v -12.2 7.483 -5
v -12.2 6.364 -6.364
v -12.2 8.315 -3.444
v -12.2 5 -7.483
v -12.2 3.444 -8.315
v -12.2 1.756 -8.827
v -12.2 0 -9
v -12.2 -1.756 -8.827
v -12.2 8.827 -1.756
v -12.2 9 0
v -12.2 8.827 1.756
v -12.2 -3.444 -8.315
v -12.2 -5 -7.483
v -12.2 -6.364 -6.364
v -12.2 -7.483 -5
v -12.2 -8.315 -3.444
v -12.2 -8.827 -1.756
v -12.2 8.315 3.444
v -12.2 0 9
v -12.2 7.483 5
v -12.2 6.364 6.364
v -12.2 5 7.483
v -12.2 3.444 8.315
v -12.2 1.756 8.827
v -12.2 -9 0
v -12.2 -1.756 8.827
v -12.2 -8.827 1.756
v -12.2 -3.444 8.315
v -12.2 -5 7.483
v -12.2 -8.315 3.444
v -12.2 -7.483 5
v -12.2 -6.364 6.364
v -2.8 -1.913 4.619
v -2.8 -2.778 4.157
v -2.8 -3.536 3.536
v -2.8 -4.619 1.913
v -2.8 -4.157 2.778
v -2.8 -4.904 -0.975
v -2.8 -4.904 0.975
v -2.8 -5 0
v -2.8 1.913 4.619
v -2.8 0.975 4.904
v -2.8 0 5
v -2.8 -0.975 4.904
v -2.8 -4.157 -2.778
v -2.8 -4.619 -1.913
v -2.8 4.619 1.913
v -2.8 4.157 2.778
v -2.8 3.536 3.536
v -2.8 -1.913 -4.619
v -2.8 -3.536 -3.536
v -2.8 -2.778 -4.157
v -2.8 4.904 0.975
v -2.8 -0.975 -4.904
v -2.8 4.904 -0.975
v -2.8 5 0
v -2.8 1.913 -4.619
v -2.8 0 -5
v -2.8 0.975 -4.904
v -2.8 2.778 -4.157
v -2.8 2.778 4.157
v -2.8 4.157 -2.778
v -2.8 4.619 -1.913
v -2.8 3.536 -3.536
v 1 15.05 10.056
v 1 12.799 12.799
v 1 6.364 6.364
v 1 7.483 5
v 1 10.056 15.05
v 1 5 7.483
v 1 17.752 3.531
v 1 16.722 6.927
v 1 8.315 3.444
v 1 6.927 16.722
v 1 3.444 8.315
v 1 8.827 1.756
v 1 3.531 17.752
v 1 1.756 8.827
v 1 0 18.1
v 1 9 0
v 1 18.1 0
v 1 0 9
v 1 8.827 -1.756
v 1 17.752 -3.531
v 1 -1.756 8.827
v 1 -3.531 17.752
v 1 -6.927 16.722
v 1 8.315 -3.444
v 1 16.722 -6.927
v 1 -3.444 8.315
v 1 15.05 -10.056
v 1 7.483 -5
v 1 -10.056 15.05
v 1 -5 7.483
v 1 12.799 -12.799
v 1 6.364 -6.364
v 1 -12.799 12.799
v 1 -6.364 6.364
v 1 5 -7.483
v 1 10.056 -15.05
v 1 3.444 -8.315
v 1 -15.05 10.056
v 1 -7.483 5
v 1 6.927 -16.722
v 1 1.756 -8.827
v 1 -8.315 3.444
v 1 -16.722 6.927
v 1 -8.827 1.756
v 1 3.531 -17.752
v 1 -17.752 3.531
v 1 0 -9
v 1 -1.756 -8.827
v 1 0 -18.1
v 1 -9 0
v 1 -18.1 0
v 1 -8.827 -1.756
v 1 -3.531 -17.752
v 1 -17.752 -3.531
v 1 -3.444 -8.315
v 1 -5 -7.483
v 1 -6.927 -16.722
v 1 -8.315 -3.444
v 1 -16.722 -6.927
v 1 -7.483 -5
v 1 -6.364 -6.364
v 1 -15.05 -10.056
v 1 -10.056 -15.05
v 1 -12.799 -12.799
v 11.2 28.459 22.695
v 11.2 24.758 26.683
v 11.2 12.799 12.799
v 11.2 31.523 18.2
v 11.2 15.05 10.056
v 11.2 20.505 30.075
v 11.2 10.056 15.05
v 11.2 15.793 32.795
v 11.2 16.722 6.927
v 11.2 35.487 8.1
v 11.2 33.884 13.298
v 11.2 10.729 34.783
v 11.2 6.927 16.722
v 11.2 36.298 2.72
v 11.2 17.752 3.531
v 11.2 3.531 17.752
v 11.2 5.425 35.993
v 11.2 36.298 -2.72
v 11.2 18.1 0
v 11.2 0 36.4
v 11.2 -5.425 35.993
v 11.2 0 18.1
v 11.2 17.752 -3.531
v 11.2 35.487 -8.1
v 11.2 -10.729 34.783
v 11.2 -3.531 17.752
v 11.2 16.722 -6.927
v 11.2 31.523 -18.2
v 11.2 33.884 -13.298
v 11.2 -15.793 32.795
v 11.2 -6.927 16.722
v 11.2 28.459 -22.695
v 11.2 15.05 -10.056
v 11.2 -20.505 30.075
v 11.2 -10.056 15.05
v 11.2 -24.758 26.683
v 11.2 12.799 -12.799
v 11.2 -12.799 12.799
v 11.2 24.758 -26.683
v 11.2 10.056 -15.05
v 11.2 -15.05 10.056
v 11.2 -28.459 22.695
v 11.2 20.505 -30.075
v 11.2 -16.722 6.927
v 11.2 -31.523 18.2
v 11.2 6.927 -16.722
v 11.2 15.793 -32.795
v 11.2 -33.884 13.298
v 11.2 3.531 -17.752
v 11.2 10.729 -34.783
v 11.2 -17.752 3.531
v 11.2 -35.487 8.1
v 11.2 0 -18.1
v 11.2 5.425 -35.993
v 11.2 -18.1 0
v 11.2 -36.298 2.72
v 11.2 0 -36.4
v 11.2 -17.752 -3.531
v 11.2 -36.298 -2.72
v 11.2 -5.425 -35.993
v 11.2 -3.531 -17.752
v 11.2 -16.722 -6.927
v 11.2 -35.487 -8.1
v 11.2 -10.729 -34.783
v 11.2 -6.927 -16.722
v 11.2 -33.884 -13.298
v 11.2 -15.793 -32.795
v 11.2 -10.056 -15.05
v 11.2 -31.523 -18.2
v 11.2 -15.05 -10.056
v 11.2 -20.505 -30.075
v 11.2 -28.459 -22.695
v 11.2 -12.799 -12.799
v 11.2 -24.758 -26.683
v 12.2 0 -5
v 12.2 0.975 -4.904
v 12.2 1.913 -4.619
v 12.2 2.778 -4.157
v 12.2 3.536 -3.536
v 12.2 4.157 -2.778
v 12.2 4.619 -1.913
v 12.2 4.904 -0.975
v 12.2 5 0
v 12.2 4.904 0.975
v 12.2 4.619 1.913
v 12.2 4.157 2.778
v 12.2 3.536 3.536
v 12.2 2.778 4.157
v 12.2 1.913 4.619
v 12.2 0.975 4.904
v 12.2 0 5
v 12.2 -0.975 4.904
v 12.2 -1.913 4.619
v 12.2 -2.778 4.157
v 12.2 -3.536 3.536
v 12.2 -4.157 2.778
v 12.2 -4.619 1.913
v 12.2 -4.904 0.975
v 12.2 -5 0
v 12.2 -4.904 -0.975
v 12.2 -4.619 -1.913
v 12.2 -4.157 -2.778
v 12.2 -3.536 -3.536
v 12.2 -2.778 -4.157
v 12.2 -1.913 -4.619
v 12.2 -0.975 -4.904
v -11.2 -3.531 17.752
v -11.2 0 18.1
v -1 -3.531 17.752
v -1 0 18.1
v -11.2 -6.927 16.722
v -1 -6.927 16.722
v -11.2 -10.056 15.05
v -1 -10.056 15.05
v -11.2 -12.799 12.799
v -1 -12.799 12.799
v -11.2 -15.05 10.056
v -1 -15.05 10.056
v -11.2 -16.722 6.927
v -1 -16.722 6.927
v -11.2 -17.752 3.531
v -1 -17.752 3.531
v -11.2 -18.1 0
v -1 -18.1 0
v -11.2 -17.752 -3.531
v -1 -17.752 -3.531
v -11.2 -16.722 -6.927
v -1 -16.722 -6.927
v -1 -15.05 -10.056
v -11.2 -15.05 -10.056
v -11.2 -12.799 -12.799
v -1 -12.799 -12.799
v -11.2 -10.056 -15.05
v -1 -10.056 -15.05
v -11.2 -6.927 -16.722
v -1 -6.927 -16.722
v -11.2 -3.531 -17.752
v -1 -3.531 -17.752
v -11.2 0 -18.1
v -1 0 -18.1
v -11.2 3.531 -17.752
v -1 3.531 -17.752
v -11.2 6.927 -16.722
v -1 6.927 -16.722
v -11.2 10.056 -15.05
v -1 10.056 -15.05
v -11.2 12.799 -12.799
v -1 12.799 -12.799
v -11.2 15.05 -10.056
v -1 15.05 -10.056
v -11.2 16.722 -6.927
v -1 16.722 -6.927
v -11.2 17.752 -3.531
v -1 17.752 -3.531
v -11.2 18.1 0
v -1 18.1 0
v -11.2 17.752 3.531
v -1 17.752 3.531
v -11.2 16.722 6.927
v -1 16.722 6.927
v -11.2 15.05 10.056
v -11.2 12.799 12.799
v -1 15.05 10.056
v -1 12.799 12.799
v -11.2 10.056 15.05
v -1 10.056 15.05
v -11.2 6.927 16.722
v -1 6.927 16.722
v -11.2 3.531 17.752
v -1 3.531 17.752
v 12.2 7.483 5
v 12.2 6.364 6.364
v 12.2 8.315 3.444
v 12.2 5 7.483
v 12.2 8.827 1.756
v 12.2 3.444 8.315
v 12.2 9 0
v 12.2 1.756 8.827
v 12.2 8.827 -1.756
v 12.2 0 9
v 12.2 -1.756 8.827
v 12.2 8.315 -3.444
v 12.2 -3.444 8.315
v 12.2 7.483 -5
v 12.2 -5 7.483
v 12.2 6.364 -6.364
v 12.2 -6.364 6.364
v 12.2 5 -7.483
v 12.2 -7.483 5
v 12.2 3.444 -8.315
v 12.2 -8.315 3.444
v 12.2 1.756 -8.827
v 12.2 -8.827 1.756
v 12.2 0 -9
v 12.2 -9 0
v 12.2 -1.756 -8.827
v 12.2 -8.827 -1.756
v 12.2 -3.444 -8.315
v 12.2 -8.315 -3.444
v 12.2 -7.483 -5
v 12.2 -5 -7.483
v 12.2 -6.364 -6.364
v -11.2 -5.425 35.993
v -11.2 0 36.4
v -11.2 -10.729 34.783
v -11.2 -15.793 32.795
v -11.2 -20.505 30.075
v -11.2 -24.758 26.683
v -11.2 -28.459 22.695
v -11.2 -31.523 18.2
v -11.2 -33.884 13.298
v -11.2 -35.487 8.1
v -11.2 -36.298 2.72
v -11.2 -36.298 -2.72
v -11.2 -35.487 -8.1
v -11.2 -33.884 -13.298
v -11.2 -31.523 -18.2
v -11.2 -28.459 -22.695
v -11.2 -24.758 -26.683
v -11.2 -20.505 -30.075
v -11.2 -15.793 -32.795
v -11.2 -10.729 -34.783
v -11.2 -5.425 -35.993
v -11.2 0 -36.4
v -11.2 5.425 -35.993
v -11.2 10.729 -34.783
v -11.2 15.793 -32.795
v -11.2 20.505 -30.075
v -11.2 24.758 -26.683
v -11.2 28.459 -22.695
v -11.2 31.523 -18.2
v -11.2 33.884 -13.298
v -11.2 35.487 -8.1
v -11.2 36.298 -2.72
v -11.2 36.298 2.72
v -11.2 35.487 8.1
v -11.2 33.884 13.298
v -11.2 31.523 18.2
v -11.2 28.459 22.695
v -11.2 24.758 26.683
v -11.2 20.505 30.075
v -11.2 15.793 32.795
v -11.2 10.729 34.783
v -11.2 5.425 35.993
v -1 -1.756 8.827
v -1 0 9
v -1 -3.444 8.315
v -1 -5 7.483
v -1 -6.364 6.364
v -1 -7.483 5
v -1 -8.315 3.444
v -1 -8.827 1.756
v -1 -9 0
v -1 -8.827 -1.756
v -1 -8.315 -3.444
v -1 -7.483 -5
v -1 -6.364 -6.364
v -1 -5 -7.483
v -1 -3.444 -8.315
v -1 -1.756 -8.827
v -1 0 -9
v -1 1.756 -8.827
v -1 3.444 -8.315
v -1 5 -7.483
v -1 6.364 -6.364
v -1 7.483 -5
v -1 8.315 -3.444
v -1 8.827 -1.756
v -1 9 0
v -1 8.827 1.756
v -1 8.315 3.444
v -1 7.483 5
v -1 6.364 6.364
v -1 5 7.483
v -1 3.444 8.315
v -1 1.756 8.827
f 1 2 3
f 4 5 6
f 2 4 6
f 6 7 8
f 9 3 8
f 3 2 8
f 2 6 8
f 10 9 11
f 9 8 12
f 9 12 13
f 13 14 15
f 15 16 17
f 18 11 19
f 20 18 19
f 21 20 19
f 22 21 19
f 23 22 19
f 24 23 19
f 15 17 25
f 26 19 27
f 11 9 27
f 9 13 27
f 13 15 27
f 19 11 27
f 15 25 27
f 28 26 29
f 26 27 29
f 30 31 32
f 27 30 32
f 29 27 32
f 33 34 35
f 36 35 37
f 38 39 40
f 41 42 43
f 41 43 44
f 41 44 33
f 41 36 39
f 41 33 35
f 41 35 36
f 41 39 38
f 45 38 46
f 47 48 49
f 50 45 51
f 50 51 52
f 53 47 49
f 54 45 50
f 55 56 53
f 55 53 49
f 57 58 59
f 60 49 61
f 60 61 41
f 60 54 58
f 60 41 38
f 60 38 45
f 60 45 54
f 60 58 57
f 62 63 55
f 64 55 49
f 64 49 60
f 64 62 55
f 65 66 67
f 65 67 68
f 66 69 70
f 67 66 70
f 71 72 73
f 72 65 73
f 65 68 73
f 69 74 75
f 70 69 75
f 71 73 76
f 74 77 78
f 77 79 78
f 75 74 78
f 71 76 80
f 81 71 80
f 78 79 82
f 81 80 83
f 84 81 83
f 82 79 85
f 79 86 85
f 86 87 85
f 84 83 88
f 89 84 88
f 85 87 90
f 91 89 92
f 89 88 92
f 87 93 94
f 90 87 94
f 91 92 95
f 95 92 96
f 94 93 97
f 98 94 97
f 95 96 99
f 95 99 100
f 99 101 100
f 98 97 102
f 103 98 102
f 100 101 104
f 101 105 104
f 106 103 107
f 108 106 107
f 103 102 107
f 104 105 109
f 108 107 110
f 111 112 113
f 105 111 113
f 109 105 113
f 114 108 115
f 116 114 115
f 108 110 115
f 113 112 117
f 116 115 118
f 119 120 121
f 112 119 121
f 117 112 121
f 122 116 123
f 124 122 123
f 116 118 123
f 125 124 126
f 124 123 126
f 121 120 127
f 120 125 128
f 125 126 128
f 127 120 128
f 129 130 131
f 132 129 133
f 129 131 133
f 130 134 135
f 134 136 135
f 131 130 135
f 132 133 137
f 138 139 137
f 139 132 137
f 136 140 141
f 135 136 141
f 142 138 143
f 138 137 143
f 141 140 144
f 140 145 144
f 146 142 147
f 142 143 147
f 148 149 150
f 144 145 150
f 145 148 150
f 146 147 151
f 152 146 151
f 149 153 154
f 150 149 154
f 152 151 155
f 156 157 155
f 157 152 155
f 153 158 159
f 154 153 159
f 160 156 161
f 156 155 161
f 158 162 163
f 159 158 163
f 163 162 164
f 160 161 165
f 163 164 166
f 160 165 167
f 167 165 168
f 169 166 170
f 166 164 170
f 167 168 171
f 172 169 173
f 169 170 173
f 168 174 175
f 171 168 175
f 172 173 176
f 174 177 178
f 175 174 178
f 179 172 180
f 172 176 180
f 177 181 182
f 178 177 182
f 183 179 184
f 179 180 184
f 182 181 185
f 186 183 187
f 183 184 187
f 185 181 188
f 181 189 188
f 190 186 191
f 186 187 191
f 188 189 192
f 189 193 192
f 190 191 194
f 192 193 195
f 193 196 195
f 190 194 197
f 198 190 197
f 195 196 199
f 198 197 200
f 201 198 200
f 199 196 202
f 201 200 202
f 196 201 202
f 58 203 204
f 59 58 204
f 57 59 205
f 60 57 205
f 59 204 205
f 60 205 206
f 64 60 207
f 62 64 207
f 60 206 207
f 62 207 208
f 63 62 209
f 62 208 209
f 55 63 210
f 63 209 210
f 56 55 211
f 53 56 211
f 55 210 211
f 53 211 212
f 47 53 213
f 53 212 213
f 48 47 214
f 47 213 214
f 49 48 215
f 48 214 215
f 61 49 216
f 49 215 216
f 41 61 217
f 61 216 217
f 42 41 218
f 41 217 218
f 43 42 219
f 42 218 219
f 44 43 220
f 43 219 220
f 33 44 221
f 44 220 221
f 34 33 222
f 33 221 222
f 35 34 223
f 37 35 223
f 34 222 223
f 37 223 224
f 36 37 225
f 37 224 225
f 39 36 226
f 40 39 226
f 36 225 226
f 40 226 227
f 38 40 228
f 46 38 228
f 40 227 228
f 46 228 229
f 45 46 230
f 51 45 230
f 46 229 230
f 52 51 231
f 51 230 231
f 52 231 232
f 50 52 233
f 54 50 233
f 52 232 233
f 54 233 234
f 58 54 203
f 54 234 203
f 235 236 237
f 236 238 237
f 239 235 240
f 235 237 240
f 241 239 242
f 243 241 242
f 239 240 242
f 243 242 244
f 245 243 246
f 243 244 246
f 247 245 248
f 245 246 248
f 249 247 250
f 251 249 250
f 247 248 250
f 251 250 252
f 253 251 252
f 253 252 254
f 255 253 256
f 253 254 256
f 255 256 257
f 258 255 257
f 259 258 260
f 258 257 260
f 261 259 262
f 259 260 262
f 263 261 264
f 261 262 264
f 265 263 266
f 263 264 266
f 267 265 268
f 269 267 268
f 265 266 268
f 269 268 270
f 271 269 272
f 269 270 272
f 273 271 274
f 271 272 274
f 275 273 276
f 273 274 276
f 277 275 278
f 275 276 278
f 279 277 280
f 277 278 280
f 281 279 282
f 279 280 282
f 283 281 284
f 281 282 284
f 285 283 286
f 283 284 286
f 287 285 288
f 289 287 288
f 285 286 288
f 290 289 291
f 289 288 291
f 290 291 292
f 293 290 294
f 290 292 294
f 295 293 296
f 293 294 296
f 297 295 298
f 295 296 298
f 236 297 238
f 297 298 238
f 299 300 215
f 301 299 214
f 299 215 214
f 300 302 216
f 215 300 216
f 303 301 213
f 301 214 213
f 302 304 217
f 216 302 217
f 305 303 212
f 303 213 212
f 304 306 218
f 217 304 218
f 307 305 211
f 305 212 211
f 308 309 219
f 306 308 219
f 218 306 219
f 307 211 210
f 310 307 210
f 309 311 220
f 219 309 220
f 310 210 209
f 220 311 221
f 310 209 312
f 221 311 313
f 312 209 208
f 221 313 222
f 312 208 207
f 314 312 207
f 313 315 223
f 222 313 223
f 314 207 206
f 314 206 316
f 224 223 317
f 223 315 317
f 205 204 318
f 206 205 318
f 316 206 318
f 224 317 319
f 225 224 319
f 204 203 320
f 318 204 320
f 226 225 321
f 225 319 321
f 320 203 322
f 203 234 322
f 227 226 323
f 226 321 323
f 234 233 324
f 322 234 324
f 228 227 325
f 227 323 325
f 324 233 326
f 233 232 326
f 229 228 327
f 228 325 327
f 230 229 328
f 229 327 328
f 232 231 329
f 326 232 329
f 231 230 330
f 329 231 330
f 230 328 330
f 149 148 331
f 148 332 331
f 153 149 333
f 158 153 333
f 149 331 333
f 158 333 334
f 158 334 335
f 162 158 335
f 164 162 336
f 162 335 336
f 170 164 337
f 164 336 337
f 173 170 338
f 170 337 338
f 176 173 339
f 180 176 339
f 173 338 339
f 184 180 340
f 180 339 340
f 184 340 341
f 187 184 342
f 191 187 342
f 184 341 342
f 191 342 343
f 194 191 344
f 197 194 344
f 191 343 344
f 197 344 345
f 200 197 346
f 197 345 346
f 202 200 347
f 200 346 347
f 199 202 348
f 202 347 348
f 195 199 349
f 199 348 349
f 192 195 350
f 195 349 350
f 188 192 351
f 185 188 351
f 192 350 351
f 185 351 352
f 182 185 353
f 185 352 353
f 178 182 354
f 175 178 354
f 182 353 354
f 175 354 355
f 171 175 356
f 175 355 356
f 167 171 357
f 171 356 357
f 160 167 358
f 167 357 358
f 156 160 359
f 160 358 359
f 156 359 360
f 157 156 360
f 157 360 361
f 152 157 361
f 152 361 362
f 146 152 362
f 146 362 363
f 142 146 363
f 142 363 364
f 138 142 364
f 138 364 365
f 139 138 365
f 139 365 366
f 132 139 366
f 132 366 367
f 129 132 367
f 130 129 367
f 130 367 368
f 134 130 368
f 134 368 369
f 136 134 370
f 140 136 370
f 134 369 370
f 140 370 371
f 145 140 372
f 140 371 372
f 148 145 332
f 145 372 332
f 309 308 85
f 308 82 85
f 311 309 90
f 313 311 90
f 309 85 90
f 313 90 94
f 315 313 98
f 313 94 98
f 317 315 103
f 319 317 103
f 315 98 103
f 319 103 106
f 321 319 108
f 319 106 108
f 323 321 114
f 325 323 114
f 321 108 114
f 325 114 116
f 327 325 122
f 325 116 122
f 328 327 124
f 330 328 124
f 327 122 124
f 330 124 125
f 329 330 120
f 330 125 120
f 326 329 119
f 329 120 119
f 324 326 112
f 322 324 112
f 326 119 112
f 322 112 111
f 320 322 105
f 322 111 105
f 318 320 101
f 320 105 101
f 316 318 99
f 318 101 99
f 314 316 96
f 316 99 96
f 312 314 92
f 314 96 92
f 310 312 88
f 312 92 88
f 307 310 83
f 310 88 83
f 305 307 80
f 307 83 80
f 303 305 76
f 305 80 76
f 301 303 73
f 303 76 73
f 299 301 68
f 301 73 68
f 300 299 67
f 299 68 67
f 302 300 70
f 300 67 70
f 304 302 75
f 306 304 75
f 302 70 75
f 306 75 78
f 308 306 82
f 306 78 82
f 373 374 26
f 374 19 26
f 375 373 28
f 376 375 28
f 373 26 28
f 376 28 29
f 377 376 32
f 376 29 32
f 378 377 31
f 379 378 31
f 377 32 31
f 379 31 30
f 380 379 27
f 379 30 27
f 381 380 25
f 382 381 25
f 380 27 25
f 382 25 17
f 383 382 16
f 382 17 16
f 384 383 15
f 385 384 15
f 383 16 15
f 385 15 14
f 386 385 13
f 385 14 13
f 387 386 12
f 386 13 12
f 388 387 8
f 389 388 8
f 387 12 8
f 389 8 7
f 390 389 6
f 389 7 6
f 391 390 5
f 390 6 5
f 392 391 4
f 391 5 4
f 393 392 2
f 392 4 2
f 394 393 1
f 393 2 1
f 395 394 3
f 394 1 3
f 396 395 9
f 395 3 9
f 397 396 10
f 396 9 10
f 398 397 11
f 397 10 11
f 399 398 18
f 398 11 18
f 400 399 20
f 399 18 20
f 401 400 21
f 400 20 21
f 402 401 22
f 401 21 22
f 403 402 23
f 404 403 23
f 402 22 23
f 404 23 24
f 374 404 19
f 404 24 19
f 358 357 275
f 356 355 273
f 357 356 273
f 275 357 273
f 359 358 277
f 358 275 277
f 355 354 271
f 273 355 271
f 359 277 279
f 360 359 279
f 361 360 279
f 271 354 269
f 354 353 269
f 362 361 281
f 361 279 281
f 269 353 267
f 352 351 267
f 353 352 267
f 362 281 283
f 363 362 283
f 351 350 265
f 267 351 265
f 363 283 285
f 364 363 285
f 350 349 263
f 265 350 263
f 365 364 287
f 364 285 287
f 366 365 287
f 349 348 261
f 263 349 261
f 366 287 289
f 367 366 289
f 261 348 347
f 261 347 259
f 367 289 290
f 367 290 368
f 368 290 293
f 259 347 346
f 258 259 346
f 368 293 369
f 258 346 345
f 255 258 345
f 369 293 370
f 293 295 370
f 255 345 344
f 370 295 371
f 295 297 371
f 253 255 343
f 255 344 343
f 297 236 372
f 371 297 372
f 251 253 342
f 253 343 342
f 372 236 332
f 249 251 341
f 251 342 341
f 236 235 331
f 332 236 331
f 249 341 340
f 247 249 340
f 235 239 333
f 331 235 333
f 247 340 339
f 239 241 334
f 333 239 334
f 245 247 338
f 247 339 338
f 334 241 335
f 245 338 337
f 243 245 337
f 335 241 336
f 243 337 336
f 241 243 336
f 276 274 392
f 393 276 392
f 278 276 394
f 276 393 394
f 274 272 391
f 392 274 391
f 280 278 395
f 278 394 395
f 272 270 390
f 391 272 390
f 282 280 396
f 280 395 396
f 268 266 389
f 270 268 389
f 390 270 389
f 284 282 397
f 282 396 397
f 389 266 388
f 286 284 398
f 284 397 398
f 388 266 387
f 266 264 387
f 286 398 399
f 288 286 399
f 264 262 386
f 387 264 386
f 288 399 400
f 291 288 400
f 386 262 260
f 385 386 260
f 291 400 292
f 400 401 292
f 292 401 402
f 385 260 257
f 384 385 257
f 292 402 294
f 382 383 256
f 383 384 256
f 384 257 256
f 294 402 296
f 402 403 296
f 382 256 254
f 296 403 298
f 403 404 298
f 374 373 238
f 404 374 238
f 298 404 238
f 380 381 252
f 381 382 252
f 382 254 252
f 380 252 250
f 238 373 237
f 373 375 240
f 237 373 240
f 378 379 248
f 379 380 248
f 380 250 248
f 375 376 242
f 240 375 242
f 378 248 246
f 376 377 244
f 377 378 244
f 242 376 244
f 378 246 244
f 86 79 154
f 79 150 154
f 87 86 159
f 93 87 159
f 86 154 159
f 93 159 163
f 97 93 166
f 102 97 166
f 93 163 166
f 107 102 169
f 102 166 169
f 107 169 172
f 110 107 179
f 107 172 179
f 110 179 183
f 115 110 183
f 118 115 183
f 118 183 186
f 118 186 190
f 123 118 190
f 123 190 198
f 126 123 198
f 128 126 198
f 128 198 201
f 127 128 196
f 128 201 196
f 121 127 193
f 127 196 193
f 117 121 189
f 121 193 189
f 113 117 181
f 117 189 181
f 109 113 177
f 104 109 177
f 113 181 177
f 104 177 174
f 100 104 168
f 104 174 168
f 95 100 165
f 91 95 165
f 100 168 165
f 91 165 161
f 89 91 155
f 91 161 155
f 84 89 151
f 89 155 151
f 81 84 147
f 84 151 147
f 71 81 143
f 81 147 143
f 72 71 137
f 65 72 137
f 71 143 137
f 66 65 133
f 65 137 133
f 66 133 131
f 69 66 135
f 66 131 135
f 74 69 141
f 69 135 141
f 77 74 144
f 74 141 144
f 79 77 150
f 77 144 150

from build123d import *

# Parameters (mm, degrees)
SKETCH2_R          = 5
CUT_EXTRUDE1_DEPTH = 15


with BuildPart() as part:
    # Sketch1 → Revolve1 (revolve)
    with BuildSketch(Plane.XY, mode=Mode.PRIVATE) as revolve1_sk:
        Polygon((-11.2, 18.1), (-1, 18.1), (-1, 9), (-12.2, 9), (-12.2, 0), (12.2, 0), (12.2, 9), (1, 9), (1, 18.1), (11.2, 18.1), (11.2, 36.4), (-11.2, 36.4), align=None)
    revolve(revolve1_sk.sketch.rotate(Axis((0, 0, 0), (1, 0, 0)), 90), axis=Axis((0, 0, 0), (1, 0, 0)))

    # Sketch2 → Cut-Extrude1 (cut)
    with BuildSketch(Plane(origin=(12.2, 0, 0), x_dir=(0, 0, -1), z_dir=(1, 0, 0))):
        Circle(SKETCH2_R)
    extrude(amount=-CUT_EXTRUDE1_DEPTH, mode=Mode.SUBTRACT)


solid = part.part
